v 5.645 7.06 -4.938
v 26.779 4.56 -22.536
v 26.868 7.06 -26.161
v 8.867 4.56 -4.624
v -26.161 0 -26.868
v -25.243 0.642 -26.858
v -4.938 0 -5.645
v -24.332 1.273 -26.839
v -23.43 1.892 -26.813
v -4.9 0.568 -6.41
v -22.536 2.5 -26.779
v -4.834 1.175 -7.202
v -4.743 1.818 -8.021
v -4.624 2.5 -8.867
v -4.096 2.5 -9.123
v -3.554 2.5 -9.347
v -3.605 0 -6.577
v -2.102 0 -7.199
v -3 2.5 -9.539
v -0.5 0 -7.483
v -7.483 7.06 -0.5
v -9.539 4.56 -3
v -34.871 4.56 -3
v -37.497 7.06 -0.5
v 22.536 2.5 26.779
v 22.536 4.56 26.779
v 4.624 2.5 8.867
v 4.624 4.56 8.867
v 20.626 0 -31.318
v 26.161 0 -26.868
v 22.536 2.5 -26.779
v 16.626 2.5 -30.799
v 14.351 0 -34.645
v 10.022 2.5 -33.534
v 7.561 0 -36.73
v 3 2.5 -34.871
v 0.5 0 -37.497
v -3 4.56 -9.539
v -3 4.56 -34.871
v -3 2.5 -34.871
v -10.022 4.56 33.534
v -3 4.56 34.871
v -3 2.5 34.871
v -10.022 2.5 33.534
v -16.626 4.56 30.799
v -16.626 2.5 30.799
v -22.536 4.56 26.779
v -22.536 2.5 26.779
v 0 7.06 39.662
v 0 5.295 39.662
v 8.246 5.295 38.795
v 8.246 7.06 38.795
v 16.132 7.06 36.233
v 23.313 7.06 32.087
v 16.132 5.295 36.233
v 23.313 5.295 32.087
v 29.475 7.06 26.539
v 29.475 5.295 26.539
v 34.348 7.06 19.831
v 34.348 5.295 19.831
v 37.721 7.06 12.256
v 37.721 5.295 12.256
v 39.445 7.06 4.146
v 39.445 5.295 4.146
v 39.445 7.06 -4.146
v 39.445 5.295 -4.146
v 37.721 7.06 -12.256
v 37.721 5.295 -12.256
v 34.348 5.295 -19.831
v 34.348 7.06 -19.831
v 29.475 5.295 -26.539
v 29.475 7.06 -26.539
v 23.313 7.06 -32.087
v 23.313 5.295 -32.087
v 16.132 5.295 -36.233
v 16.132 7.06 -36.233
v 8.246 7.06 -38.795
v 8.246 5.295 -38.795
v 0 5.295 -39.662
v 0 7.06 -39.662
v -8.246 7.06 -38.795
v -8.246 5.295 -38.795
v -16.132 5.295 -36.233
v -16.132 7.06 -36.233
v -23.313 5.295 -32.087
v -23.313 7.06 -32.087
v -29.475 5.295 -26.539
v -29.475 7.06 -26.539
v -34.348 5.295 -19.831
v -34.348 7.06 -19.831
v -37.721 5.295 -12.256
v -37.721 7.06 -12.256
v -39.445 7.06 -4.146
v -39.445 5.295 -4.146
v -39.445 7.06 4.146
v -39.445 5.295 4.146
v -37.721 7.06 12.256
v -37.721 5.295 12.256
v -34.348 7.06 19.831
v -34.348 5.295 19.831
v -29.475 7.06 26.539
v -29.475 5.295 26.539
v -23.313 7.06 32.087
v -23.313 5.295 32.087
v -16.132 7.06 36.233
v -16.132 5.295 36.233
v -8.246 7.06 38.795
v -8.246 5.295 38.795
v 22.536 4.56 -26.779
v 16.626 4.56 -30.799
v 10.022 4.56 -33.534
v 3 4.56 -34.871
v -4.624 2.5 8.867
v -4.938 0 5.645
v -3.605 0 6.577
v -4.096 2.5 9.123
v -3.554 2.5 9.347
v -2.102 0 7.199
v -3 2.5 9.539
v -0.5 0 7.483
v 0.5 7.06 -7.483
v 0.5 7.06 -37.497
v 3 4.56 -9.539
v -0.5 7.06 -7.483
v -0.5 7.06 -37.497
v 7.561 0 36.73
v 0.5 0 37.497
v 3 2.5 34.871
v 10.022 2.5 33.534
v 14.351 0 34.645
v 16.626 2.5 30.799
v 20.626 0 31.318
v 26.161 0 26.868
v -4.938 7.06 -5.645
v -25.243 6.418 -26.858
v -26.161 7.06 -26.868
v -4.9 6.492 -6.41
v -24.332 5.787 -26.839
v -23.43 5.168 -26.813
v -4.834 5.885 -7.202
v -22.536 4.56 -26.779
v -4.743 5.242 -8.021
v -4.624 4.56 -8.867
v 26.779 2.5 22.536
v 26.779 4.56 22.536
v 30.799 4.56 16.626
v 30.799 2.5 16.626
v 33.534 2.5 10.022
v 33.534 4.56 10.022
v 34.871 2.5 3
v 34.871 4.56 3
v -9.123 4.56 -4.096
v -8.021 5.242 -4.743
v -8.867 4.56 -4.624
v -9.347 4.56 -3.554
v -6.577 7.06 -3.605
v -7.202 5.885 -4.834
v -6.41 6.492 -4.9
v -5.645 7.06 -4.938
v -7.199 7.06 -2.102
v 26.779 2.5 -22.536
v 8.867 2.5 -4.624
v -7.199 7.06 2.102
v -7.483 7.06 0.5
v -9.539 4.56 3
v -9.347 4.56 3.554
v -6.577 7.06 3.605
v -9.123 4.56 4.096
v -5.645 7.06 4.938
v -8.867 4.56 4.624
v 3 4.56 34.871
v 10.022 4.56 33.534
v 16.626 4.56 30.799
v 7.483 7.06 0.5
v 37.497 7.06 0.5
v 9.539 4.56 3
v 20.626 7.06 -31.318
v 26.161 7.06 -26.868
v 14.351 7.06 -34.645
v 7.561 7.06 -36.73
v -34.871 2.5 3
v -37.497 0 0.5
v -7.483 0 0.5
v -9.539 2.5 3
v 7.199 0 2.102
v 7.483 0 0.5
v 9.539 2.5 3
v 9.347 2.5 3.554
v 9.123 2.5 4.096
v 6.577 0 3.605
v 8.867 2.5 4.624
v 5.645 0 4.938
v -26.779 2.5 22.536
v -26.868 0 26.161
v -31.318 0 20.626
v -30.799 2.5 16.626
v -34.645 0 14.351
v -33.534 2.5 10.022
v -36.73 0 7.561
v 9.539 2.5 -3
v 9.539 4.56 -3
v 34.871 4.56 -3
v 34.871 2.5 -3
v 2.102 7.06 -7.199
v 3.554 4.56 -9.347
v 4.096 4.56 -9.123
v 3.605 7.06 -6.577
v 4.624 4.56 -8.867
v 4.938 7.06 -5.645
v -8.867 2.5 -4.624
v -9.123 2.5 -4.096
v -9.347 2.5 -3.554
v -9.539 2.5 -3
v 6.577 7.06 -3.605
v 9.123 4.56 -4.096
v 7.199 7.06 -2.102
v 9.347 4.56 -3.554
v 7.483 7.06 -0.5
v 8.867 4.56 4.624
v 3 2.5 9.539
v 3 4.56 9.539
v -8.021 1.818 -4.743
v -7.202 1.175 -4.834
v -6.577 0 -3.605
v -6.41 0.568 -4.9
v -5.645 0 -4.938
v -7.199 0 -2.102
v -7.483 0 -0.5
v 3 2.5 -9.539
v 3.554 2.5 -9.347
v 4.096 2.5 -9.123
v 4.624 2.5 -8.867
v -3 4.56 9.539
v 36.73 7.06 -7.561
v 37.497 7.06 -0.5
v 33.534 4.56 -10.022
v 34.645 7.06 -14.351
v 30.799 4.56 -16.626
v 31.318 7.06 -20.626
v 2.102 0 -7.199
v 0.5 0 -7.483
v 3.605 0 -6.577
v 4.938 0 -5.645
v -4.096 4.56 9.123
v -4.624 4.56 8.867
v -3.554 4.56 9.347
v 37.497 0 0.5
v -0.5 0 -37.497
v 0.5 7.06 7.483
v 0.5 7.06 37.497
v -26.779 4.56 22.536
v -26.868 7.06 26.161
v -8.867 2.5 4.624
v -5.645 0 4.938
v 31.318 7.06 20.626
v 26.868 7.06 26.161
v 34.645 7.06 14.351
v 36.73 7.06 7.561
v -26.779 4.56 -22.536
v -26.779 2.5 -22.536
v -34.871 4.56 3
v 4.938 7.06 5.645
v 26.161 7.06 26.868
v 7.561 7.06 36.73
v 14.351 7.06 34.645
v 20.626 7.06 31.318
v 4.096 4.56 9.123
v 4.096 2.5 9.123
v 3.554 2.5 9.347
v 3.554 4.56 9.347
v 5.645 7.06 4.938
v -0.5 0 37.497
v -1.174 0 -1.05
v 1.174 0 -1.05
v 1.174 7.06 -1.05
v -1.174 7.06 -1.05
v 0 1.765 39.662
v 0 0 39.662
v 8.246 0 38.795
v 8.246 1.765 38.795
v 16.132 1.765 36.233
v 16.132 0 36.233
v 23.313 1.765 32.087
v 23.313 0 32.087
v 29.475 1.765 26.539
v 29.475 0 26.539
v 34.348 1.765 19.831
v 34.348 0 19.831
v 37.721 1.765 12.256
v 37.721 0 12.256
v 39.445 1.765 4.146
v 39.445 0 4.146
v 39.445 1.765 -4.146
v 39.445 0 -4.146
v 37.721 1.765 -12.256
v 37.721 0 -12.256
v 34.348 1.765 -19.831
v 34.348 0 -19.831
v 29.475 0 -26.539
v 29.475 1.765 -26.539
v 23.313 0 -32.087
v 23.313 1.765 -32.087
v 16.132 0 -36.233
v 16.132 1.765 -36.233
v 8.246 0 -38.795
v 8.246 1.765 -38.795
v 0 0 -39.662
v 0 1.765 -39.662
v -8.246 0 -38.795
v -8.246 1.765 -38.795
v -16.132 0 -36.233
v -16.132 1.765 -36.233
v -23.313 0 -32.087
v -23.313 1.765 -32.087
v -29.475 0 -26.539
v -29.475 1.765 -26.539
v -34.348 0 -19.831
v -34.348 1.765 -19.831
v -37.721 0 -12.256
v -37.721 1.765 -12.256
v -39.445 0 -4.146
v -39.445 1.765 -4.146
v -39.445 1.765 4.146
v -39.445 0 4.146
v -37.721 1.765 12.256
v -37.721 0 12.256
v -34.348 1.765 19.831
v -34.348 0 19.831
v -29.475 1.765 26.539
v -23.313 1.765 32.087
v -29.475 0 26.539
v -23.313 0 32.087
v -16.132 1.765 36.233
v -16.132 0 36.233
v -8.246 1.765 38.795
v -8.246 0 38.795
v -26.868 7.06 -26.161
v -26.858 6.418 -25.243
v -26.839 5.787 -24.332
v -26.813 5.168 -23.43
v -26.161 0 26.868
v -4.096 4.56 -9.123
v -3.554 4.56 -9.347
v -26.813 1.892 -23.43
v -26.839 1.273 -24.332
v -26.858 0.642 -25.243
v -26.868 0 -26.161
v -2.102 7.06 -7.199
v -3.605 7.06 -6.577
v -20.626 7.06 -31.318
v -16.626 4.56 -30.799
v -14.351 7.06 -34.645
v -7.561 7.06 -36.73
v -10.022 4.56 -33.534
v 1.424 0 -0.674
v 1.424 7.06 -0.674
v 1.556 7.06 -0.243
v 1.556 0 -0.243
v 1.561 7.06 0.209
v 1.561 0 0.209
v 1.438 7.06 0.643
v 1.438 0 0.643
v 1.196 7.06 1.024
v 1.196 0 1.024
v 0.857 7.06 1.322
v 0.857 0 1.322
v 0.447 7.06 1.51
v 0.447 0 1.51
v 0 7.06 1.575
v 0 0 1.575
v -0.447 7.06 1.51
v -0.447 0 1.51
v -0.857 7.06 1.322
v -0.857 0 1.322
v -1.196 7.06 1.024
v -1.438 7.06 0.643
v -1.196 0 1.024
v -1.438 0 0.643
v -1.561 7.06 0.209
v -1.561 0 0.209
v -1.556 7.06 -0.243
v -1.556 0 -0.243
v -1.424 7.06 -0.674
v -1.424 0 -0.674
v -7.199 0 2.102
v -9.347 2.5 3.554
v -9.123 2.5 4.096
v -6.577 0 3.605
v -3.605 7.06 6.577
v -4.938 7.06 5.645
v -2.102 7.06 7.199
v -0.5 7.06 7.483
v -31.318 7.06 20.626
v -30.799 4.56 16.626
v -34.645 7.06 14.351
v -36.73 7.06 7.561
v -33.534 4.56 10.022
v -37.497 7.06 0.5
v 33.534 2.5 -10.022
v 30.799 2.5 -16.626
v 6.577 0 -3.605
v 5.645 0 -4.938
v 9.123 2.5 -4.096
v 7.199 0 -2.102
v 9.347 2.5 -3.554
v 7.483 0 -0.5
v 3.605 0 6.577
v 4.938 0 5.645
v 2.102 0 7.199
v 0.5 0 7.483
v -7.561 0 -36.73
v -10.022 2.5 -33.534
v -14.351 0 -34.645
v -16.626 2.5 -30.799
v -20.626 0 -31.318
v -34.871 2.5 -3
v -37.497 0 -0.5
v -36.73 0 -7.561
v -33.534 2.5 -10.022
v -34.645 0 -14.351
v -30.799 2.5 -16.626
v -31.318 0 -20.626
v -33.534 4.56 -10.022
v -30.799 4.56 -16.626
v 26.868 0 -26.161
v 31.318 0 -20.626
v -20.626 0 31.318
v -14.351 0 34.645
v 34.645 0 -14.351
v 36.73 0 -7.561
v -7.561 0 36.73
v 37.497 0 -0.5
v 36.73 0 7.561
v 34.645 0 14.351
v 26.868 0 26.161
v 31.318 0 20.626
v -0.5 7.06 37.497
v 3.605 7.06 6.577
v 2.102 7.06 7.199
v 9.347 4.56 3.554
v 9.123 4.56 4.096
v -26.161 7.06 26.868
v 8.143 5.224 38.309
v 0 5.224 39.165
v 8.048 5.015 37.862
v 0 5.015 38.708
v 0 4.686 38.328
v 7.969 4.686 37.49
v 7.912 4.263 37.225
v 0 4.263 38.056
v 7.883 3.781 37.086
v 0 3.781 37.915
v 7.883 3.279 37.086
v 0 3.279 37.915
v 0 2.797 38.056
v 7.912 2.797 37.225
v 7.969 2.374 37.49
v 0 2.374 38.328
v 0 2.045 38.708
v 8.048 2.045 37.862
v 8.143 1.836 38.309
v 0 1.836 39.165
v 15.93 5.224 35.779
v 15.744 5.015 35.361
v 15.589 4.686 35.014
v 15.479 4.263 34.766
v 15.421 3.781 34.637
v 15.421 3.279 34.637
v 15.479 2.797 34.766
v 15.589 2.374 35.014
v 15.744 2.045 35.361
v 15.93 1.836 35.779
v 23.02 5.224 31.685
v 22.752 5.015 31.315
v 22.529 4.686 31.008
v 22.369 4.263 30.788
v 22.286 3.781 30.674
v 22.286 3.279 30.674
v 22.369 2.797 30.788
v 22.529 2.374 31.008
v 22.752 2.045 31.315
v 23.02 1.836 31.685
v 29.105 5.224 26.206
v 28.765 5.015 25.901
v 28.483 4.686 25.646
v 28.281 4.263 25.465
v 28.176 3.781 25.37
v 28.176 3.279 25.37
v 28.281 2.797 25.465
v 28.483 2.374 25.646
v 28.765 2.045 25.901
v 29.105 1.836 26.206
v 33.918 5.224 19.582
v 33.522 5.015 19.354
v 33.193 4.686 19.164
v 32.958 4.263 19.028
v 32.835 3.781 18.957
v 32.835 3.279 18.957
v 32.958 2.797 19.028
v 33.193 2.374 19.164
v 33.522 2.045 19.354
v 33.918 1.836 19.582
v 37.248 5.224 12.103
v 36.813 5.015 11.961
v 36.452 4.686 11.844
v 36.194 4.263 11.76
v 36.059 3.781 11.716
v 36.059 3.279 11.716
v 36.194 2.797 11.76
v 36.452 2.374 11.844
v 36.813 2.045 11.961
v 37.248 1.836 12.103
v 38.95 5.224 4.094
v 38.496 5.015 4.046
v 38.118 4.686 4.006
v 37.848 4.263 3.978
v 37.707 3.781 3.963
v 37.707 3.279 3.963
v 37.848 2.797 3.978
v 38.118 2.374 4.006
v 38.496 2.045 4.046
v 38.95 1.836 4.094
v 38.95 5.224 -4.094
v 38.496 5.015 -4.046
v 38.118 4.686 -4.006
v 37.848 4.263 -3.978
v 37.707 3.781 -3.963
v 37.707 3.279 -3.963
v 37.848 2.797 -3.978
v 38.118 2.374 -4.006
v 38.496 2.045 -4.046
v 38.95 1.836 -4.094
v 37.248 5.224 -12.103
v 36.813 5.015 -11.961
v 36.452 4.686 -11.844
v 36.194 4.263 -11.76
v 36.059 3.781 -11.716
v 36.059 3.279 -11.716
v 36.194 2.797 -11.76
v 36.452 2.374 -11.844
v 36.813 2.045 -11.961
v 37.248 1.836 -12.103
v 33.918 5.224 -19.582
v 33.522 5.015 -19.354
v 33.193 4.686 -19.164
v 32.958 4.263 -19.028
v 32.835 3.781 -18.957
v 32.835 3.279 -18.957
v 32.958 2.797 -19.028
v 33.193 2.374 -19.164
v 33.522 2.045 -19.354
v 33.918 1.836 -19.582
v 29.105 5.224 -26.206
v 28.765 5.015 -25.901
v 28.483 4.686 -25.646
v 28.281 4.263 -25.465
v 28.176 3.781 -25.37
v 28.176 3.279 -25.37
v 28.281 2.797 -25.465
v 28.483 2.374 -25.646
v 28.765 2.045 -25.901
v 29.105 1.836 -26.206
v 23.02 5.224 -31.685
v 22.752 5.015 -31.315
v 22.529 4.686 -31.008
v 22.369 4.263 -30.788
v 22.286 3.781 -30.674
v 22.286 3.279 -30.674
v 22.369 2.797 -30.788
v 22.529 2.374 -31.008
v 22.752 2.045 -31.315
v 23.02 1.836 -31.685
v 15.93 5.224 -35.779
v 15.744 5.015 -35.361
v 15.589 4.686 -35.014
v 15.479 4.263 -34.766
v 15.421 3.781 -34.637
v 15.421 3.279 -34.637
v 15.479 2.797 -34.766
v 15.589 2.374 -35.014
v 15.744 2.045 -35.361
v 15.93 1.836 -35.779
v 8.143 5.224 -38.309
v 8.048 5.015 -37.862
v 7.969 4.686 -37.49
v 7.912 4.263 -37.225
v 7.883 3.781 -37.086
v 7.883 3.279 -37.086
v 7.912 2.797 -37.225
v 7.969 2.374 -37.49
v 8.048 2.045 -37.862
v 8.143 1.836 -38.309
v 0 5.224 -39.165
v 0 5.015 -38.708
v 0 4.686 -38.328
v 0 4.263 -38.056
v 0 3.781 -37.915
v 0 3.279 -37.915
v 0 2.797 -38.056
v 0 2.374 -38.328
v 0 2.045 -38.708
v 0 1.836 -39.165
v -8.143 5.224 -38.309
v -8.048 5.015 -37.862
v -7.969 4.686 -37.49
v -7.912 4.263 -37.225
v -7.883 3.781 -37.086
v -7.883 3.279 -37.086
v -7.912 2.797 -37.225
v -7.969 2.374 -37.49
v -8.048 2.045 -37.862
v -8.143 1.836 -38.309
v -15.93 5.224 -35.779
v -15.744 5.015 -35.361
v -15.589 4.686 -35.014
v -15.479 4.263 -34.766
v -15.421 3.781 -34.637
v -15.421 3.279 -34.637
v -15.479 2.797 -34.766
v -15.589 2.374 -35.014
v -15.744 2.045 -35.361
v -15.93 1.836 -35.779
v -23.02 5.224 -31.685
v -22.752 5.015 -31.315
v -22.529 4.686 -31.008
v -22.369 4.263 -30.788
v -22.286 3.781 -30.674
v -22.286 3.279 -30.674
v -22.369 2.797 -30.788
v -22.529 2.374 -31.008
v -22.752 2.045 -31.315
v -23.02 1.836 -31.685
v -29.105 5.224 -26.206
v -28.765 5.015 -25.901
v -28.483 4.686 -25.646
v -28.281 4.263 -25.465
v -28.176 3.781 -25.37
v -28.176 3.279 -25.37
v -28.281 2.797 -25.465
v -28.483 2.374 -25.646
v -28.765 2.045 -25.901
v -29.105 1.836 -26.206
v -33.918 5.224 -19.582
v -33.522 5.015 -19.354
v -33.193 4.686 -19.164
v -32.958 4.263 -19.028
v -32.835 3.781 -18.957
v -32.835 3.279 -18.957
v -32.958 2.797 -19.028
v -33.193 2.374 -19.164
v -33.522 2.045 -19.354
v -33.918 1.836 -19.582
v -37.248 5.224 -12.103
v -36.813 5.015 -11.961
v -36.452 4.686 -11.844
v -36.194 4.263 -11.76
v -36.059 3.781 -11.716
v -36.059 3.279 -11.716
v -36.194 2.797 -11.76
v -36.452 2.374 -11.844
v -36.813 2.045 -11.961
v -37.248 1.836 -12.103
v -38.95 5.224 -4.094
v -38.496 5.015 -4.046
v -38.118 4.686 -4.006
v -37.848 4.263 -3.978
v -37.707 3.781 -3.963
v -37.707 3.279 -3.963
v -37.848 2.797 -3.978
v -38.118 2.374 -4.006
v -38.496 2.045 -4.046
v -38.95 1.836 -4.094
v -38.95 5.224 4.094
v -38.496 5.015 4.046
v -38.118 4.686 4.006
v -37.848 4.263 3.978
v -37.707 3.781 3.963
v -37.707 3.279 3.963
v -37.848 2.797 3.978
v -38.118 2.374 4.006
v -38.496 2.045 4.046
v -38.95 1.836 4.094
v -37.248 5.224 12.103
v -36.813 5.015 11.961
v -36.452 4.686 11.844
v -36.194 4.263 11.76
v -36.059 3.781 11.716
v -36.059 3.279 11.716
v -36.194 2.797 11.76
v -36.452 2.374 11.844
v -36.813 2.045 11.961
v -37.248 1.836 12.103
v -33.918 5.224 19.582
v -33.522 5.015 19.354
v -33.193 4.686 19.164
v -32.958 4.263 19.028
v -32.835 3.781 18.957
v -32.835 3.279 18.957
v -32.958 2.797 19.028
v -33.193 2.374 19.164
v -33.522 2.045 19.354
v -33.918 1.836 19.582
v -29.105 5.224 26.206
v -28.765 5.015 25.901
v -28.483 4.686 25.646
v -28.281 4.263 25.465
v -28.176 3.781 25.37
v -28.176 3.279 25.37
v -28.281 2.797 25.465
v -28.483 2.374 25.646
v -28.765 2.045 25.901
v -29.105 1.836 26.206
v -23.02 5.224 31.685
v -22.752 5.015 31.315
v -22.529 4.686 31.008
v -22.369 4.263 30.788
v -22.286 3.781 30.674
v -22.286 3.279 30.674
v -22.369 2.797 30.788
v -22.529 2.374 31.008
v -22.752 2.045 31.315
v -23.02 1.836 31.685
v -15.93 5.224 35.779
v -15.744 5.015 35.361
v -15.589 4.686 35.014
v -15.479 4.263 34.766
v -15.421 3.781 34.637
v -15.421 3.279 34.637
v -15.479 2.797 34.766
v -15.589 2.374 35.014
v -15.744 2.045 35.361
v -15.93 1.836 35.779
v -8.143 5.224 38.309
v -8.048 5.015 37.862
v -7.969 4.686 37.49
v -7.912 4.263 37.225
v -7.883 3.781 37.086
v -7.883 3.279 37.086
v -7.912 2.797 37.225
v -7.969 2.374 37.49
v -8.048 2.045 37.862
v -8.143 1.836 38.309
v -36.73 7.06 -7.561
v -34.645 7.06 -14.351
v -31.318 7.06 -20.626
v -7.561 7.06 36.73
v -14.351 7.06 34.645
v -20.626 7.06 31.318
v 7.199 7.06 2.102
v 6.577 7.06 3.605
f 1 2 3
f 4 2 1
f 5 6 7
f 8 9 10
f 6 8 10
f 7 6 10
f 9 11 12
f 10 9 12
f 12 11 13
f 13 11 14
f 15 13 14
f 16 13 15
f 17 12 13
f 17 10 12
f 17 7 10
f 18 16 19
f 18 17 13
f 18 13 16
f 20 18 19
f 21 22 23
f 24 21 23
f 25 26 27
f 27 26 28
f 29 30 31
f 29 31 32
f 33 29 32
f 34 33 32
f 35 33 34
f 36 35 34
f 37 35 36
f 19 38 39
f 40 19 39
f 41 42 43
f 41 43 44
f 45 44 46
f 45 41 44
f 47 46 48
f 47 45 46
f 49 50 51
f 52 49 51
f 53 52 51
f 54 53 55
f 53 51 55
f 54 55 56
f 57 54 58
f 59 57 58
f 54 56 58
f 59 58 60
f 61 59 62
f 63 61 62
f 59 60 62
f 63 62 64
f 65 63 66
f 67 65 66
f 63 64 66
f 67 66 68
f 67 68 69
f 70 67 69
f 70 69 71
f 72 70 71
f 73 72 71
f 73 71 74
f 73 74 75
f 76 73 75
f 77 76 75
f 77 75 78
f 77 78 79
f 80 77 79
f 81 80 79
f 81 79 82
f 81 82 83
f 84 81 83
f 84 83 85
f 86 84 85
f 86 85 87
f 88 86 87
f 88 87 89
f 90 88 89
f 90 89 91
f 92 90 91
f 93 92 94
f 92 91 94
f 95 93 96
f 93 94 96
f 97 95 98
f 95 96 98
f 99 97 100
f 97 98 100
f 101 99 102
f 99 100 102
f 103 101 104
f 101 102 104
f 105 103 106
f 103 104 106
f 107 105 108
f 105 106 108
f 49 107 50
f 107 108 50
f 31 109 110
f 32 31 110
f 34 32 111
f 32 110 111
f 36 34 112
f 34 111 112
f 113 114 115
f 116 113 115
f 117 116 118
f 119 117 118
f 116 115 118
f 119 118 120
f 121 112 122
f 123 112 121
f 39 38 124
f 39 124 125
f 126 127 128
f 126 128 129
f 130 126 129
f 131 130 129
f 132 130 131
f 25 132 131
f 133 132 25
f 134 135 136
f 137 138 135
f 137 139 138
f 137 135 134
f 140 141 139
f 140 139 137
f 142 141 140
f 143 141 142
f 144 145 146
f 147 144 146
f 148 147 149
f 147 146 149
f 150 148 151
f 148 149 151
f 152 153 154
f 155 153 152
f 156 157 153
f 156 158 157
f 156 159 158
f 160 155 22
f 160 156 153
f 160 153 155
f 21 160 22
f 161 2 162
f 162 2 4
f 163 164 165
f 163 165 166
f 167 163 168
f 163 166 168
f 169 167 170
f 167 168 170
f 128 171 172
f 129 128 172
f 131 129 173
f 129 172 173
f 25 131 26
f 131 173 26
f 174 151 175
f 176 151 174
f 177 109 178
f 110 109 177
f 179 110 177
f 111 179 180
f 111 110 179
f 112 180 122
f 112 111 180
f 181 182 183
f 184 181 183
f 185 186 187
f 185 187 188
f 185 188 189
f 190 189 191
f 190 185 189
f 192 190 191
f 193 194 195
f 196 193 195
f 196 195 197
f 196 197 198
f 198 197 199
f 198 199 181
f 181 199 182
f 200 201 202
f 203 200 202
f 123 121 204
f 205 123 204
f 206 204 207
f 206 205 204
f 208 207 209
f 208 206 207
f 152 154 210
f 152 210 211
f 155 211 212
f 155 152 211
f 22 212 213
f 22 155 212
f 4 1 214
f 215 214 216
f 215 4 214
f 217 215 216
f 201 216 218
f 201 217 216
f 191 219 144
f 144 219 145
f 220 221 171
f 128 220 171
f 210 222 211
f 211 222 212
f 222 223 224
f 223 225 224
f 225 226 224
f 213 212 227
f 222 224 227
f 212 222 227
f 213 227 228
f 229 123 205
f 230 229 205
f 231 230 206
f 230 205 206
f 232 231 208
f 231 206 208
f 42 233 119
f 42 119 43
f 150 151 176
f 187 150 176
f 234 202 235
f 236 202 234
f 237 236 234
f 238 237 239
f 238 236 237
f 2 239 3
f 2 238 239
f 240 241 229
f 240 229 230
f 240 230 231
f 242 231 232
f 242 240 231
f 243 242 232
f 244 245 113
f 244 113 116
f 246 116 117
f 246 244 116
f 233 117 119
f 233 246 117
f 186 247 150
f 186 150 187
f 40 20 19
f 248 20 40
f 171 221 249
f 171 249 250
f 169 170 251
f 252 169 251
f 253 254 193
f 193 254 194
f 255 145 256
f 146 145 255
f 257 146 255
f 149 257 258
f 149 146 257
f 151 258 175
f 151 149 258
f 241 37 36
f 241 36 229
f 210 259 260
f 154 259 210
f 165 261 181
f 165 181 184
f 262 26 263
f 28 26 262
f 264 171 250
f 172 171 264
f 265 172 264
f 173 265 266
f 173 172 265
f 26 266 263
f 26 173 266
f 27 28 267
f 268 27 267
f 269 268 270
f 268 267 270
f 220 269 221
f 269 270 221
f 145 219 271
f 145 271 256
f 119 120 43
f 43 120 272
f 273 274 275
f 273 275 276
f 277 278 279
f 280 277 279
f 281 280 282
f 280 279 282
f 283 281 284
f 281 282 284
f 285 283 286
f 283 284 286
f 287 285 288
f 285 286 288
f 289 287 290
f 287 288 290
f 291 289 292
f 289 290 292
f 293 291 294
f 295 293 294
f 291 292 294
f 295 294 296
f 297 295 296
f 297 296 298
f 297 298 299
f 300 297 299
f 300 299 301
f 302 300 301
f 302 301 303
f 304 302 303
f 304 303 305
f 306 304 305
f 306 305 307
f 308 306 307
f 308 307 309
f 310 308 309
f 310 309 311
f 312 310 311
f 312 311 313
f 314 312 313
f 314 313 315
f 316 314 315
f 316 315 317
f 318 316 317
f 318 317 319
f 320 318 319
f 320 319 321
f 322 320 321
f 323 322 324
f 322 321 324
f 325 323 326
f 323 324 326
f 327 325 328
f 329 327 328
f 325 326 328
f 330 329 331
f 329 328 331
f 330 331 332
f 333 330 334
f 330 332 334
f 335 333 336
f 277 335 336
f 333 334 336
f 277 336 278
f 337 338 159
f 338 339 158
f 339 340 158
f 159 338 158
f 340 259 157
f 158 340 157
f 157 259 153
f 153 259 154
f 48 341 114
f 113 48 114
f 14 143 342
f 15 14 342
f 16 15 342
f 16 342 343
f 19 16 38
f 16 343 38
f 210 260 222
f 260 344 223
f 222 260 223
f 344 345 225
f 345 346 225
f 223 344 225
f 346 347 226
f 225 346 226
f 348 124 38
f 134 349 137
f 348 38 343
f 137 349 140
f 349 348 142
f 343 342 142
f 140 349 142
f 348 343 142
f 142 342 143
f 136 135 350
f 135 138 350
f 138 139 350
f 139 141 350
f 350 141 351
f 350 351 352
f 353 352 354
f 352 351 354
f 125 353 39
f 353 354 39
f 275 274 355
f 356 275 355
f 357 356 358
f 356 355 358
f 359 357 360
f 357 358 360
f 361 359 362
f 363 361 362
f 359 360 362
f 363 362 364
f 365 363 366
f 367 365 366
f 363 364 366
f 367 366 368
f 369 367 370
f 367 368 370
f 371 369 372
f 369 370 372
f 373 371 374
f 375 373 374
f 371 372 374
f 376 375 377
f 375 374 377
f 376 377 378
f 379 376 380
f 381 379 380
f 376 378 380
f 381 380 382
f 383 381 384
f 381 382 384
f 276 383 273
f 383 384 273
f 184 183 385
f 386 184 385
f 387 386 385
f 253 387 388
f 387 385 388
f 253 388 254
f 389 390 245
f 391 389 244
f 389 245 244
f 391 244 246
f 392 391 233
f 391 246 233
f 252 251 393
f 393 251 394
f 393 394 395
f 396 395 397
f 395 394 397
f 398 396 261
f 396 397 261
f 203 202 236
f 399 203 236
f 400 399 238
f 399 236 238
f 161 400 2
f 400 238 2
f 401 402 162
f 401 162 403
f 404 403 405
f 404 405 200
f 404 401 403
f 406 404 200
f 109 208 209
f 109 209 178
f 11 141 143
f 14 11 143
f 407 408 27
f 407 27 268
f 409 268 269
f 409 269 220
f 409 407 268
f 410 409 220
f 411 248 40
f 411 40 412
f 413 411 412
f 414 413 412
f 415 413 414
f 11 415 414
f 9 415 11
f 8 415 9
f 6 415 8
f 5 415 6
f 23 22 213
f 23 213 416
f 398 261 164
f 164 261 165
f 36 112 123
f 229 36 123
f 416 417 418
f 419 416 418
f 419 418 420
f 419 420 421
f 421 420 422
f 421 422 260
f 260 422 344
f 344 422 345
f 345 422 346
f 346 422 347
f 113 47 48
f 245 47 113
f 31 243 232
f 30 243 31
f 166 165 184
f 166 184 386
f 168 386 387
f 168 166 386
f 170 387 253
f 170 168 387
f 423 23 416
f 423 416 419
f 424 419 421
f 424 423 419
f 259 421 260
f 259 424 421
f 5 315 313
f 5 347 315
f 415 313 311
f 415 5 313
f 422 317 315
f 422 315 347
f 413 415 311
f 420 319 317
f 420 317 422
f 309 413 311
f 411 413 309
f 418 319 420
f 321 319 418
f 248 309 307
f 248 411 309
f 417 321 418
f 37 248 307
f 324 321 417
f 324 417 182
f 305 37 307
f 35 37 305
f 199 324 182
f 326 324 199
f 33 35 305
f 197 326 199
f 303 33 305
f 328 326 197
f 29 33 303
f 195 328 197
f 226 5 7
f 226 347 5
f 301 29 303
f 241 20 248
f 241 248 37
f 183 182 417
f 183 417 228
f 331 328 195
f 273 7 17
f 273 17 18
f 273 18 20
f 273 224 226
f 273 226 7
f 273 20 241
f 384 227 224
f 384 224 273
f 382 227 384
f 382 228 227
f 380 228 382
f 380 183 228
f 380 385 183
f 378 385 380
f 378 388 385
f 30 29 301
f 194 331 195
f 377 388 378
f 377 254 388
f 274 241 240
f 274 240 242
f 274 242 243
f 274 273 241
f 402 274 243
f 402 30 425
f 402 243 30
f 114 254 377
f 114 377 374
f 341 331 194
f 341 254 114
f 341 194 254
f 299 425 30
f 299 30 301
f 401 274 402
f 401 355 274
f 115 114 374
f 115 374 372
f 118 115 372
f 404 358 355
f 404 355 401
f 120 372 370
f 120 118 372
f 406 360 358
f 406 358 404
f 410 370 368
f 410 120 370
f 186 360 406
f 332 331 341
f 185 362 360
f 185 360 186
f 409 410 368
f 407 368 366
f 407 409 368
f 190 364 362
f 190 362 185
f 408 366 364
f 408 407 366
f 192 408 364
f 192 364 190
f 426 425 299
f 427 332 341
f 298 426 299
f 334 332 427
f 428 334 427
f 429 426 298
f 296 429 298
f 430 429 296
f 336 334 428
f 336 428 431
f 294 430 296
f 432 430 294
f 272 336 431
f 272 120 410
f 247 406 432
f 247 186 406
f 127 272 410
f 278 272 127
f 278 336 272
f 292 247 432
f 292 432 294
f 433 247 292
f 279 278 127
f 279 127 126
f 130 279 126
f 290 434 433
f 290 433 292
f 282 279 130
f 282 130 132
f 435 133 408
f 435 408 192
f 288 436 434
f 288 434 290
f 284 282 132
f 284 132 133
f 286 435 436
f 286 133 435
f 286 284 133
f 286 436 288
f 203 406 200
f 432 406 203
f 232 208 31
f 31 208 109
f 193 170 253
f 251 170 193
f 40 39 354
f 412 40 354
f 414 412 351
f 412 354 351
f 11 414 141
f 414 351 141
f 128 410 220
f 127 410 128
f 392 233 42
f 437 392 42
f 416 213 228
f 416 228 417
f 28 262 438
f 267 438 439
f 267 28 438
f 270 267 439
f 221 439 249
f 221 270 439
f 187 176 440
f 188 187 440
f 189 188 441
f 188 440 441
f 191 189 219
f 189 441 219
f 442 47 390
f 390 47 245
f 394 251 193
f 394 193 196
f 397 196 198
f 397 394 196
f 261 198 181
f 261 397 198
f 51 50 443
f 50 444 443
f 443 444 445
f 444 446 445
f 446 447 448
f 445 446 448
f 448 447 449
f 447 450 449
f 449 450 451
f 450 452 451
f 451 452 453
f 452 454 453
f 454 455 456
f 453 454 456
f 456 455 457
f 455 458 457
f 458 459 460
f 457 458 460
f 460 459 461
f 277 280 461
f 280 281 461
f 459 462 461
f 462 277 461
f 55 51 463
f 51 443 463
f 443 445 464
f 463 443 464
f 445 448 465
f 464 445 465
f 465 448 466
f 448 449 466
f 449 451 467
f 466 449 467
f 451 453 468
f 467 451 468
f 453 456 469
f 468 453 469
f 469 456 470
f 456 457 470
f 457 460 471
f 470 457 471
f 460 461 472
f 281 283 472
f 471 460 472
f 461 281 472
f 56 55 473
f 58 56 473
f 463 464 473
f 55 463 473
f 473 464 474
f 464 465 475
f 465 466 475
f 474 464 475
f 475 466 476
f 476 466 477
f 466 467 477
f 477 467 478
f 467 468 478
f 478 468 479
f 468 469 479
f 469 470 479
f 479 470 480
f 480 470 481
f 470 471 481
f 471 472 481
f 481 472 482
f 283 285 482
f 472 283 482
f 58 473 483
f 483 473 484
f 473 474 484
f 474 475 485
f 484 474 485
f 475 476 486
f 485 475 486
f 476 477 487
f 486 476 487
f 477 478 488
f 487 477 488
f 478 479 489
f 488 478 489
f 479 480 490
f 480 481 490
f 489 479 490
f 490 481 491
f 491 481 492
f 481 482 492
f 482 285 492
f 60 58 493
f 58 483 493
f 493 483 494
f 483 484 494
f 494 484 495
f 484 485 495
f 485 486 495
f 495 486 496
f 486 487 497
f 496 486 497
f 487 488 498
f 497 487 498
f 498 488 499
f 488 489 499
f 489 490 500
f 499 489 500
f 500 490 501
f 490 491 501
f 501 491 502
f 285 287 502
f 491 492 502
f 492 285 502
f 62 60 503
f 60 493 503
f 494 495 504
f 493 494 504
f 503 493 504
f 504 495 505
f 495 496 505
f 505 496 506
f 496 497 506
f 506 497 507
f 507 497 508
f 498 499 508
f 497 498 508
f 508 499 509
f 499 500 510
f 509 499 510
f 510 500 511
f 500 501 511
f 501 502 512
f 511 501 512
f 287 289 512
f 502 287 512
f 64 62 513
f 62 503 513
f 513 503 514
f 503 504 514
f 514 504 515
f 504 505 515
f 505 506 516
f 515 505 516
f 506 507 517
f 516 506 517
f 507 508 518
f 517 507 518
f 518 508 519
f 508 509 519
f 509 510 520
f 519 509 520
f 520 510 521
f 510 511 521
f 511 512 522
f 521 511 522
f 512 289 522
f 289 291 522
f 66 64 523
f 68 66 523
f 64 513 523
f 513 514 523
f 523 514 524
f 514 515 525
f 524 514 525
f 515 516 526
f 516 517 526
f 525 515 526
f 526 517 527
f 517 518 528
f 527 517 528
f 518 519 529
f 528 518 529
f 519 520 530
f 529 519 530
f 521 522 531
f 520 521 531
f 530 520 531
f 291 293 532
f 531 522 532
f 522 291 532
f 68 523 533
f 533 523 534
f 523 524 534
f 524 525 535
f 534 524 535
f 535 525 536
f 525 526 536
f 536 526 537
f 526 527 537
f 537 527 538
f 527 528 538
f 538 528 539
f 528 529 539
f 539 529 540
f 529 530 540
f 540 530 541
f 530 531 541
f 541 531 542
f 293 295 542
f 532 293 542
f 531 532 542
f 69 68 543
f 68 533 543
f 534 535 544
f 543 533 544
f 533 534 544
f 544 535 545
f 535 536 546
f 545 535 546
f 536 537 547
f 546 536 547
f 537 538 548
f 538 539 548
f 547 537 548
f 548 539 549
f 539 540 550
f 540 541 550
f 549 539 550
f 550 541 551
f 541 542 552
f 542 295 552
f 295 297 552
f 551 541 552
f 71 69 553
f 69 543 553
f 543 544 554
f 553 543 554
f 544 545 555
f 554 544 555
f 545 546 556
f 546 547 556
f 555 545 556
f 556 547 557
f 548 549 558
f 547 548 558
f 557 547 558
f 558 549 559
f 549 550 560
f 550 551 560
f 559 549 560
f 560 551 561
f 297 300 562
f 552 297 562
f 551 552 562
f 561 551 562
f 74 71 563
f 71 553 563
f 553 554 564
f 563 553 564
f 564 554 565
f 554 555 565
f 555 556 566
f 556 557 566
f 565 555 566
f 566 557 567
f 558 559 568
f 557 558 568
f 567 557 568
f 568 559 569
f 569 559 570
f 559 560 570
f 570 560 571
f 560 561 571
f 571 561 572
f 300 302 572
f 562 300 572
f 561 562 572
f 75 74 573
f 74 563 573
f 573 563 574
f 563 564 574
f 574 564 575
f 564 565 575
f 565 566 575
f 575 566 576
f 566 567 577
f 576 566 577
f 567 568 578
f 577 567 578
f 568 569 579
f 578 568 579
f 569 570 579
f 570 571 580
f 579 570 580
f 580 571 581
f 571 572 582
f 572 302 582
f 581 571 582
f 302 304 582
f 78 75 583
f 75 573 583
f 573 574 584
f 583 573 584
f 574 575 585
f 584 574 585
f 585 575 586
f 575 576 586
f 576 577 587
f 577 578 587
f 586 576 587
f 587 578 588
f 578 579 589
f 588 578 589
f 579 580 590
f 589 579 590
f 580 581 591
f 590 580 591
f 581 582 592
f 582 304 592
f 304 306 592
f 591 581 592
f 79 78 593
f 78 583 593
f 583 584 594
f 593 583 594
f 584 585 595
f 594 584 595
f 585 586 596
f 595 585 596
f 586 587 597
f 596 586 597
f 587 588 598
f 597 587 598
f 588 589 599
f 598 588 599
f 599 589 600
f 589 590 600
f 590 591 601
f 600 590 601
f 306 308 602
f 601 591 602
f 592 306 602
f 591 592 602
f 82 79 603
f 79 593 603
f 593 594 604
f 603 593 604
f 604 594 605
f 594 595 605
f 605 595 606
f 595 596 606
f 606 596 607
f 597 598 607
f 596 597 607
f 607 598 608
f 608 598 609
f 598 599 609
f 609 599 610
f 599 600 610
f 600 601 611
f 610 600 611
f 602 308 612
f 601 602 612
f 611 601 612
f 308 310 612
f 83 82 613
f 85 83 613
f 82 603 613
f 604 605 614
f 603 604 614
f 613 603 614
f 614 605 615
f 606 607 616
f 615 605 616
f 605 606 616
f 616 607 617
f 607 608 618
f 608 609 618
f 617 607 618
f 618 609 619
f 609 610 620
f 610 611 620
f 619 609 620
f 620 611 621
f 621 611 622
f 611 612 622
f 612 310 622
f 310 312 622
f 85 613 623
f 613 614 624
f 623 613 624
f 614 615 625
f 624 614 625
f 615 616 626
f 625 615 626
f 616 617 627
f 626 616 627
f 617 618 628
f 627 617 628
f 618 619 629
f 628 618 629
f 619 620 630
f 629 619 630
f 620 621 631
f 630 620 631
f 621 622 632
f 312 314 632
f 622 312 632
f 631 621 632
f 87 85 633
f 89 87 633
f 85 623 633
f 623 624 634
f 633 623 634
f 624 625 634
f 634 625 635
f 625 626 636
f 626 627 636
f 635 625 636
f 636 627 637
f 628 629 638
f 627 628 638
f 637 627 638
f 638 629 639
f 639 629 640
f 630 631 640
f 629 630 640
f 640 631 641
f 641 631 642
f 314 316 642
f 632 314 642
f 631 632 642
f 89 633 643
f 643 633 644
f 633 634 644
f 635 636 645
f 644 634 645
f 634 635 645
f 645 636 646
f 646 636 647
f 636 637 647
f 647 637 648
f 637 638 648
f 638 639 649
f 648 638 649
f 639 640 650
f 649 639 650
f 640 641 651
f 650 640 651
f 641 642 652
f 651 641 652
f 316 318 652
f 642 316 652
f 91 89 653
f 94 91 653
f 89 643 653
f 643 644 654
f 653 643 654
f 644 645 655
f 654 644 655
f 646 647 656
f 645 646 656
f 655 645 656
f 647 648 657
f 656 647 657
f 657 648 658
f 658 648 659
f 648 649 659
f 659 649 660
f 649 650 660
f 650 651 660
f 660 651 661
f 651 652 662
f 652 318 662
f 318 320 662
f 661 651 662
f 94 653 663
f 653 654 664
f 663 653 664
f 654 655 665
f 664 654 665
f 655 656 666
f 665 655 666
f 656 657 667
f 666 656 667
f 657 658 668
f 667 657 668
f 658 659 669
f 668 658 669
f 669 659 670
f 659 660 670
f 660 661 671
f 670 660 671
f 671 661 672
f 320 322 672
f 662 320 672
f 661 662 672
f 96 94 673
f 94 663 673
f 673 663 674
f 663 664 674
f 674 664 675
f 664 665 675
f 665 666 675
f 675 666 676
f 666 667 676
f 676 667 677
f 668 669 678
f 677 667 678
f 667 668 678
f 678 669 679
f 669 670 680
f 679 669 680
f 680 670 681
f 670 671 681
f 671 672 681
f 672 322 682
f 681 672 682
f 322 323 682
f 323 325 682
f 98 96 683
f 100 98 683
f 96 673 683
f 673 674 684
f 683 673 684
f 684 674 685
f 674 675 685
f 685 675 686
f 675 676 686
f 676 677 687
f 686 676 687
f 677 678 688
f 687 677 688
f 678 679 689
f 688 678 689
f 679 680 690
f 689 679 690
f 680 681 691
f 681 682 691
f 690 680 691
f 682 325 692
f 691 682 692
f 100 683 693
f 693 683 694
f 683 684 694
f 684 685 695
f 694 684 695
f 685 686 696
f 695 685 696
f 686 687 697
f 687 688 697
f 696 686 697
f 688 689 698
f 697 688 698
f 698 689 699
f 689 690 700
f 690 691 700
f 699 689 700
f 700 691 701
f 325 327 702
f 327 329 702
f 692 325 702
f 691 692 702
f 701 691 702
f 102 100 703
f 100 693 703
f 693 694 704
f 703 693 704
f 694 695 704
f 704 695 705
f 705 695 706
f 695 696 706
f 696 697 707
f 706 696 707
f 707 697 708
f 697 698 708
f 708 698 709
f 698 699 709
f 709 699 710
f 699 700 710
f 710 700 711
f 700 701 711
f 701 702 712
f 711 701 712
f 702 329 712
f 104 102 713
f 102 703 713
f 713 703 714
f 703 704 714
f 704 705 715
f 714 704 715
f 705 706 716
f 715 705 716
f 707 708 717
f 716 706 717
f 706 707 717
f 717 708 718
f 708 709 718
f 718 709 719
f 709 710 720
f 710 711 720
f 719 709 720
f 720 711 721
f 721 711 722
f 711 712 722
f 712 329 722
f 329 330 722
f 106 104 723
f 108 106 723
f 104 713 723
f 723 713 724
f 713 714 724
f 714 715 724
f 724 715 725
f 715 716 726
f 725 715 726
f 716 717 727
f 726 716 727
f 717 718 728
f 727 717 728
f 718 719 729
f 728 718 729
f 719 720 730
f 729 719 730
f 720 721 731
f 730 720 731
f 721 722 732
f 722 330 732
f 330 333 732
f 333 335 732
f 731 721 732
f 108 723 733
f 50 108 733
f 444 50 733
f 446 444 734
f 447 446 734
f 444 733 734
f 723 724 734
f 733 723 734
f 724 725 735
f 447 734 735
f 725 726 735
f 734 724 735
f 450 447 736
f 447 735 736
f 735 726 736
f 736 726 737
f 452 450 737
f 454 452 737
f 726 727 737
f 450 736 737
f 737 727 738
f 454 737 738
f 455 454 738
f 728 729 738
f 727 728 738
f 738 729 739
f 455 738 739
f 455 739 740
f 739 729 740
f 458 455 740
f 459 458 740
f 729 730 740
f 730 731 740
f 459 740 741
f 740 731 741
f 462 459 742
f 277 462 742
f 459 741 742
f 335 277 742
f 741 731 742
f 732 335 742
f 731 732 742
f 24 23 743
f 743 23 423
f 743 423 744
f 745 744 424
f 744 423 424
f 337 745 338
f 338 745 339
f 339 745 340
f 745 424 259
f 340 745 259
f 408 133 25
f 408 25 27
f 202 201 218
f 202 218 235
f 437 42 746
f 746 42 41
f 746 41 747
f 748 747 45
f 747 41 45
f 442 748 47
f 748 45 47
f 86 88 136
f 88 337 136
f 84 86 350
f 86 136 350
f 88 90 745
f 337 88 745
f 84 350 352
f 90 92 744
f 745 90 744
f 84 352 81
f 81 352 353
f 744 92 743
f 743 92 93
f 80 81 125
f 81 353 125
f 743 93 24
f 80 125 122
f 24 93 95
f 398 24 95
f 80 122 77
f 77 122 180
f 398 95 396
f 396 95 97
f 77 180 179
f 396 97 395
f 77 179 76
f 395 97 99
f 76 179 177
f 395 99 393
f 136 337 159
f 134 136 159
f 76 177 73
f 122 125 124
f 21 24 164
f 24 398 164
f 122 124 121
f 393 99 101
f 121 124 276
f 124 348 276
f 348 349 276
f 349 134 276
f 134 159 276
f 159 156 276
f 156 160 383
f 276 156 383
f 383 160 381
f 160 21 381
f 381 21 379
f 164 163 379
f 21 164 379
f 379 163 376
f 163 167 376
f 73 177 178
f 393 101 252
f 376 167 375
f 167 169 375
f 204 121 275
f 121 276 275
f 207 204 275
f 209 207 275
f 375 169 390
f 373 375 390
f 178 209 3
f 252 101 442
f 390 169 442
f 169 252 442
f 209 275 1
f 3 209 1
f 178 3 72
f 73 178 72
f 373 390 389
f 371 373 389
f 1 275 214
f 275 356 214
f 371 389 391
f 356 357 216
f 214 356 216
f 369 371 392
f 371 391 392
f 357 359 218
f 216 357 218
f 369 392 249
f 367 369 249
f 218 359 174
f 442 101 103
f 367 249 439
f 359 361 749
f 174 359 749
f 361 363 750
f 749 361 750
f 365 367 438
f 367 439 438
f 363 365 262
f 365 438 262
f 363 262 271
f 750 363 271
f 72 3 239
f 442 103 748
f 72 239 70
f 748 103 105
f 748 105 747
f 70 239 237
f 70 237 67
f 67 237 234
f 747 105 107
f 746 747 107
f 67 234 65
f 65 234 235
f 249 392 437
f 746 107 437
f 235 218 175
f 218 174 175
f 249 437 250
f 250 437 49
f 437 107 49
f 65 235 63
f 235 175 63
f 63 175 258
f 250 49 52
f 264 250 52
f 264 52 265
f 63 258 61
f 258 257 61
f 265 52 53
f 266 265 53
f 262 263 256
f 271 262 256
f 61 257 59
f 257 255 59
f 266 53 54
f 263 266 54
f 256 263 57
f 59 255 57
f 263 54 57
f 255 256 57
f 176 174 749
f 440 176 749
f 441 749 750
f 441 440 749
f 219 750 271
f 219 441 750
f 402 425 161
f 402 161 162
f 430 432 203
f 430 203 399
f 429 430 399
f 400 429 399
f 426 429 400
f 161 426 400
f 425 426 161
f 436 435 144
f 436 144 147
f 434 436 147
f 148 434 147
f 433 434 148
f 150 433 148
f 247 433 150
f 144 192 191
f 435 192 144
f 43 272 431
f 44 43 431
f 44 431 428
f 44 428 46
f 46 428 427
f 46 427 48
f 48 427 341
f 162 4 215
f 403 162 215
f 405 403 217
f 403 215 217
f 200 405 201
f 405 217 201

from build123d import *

# Parameters (mm, degrees)
SKETCH1_R           = 39.6621
BOSS_EXTRUDE2_DEPTH = 7.06
SKETCH5_R           = 1.7653
SKETCH7_R           = 1.575
CUT_EXTRUDE1_DEPTH  = 7.06
BOSS_EXTRUDE4_DEPTH = 7.06
CUT_EXTRUDE2_DEPTH  = 7.06
CHAMFER9_SIZE       = 2.5
CHAMFER10_SIZE      = 2.5
CHAMFER11_SIZE      = 2.5
CHAMFER12_SIZE      = 2.5


with BuildPart() as part:
    # Sketch1 → Boss-Extrude2 (new body)
    with BuildSketch(Plane(origin=(0, 0, 0), x_dir=(1, 0, 0), z_dir=(0, 1, 0))):
        with Locations(Location((0, 0, 0), (0, 0, 270))):
            Circle(SKETCH1_R)
    extrude(amount=BOSS_EXTRUDE2_DEPTH)

    # Sketch5 → Cut-Revolve1 (revolve, cut)
    with BuildSketch(Plane(origin=(0, 0, 0), x_dir=(0, 0, -1), z_dir=(1, 0, 0)), mode=Mode.PRIVATE) as cut_revolve1_sk:
        with Locations((39.6621, 3.53)):
            Circle(SKETCH5_R)
    revolve(cut_revolve1_sk.sketch.rotate(Axis((0, 3.53, 0), (0, 1, 0)), 180), axis=Axis((0, 3.53, 0), (0, 1, 0)), mode=Mode.SUBTRACT)

    # Sketch7 → Cut-Extrude1 (cut)
    with BuildSketch(Plane.XZ):
        with Locations(Location((0, 0, 0), (0, 0, 270))):
            Circle(SKETCH7_R)
    extrude(amount=-CUT_EXTRUDE1_DEPTH, mode=Mode.SUBTRACT)

    # Sketch8 → Boss-Extrude4 (add)
    with BuildSketch(Plane.XZ):
        with BuildLine():
            Line((1.173935688, -1.05), (-1.173935688, -1.05))
            ThreePointArc((-1.173935688, -1.05), (0, -1.575), (1.173935688, -1.05))
        make_face()
    extrude(amount=-BOSS_EXTRUDE4_DEPTH)

    # Sketch9 → Cut-Extrude2 (cut)
    with BuildSketch(Plane(origin=(0, 7.06, 0), x_dir=(1, 0, 0), z_dir=(0, 1, 0))):
        with BuildLine():
            Line((-26.778976355, 22.536335668), (-8.866689125, 4.624048438))
            ThreePointArc((-8.866689125, 4.624048438), (-9.238795325, 3.826834324), (-9.539392014, 3))
            Line((-9.539392014, 3), (-34.871191548, 3))
            ThreePointArc((-34.871191548, 3), (-32.335783638, 13.393920133), (-26.778976355, 22.536335668))
        make_face()
        with BuildLine():
            Line((-34.871191548, -3), (-9.539392014, -3))
            ThreePointArc((-9.539392014, -3), (-9.238795325, -3.826834324), (-8.866689125, -4.624048438))
            Line((-8.866689125, -4.624048438), (-26.778976355, -22.536335668))
            ThreePointArc((-26.778976355, -22.536335668), (-32.335783638, -13.393920133), (-34.871191548, -3))
        make_face()
        with BuildLine():
            Line((-22.536335668, -26.778976355), (-4.624048438, -8.866689125))
            ThreePointArc((-4.624048438, -8.866689125), (-3.826834324, -9.238795325), (-3, -9.539392014))
            Line((-3, -9.539392014), (-3, -34.871191548))
            ThreePointArc((-3, -34.871191548), (-13.393920133, -32.335783638), (-22.536335668, -26.778976355))
        make_face()
        with BuildLine():
            Line((3, -9.539392014), (3, -34.871191548))
            ThreePointArc((3, -34.871191548), (13.393920133, -32.335783638), (22.536335668, -26.778976355))
            Line((22.536335668, -26.778976355), (4.624048438, -8.866689125))
            ThreePointArc((4.624048438, -8.866689125), (3.826834324, -9.238795325), (3, -9.539392014))
        make_face()
        with BuildLine():
            Line((8.866689125, -4.624048438), (26.778976355, -22.536335668))
            ThreePointArc((26.778976355, -22.536335668), (32.335783638, -13.393920133), (34.871191548, -3))
            Line((34.871191548, -3), (9.539392014, -3))
            ThreePointArc((9.539392014, -3), (9.238795325, -3.826834324), (8.866689125, -4.624048438))
        make_face()
        with BuildLine():
            Line((9.539392014, 3), (34.871191548, 3))
            ThreePointArc((34.871191548, 3), (32.335783638, 13.393920133), (26.778976355, 22.536335668))
            Line((26.778976355, 22.536335668), (8.866689125, 4.624048438))
            ThreePointArc((8.866689125, 4.624048438), (9.238795325, 3.826834324), (9.539392014, 3))
        make_face()
        with BuildLine():
            Line((3, 34.871191548), (3, 9.539392014))
            ThreePointArc((3, 9.539392014), (3.826834324, 9.238795325), (4.624048438, 8.866689125))
            Line((4.624048438, 8.866689125), (22.536335668, 26.778976355))
            ThreePointArc((22.536335668, 26.778976355), (13.393920133, 32.335783638), (3, 34.871191548))
        make_face()
        with BuildLine():
            Line((-22.536335668, 26.778976355), (-4.624048438, 8.866689125))
            ThreePointArc((-4.624048438, 8.866689125), (-3.826834324, 9.238795325), (-3, 9.539392014))
            Line((-3, 9.539392014), (-3, 34.871191548))
            ThreePointArc((-3, 34.871191548), (-13.393920133, 32.335783638), (-22.536335668, 26.778976355))
        make_face()
    extrude(amount=-CUT_EXTRUDE2_DEPTH, mode=Mode.SUBTRACT)

    # Chamfer9
    chamfer9_edges = [part.edges().sort_by_distance(p)[0] for p in [
        (-13.580192053, 7.06, -17.82283274),
        (-17.82283274, 7.06, -13.580192053),
    ]]
    chamfer(chamfer9_edges, length=CHAMFER9_SIZE)

    # Chamfer10
    chamfer10_edges = [part.edges().sort_by_distance(p)[0] for p in [
        (-13.580192053, 0, -17.82283274),
        (-17.82283274, 0, -13.580192053),
    ]]
    chamfer(chamfer10_edges, length=CHAMFER10_SIZE)

    # Chamfer11
    chamfer11_edges = [part.edges().sort_by_distance(p)[0] for p in [
        (-9.238795325, 7.06, 3.826834324),
        (-22.205291781, 7.06, 3),
        (-32.335783638, 7.06, 13.393920133),
        (-17.82283274, 7.06, 13.580192053),
        (-3.826834324, 7.06, 9.238795325),
        (-13.580192053, 7.06, 17.82283274),
        (-13.393920133, 7.06, 32.335783638),
        (-3, 7.06, 22.205291781),
        (13.393920133, 7.06, 32.335783638),
        (3, 7.06, 22.205291781),
        (3.826834324, 7.06, 9.238795325),
        (13.580192053, 7.06, 17.82283274),
        (9.238795325, 7.06, 3.826834324),
        (17.82283274, 7.06, 13.580192053),
        (32.335783638, 7.06, 13.393920133),
        (22.205291781, 7.06, 3),
        (32.335783638, 7.06, -13.393920133),
        (22.205291781, 7.06, -3),
        (17.82283274, 7.06, -13.580192053),
        (9.238795325, 7.06, -3.826834324),
        (3.826834324, 7.06, -9.238795325),
        (13.580192053, 7.06, -17.82283274),
        (13.393920133, 7.06, -32.335783638),
        (3, 7.06, -22.205291781),
        (-14.541651461, 7.06, -31.836148837),
        (-3, 7.06, -22.205291781),
        (-4.969104941, 7.06, -8.678017981),
        (-8.678017981, 7.06, -4.969104941),
        (-22.205291781, 7.06, -3),
        (-31.836148837, 7.06, -14.541651461),
    ]]
    chamfer(chamfer11_edges, length=CHAMFER11_SIZE)

    # Chamfer12
    chamfer12_edges = [part.edges().sort_by_distance(p)[0] for p in [
        (3.826834324, 0, -9.238795325),
        (13.580192053, 0, -17.82283274),
        (13.393920133, 0, -32.335783638),
        (3, 0, -22.205291781),
        (-14.541651461, 0, -31.836148837),
        (-4.969104941, 0, -8.678017981),
        (-3, 0, -22.205291781),
        (-8.678017981, 0, -4.969104941),
        (-31.836148837, 0, -14.541651461),
        (-22.205291781, 0, -3),
        (-17.82283274, 0, 13.580192053),
        (-9.238795325, 0, 3.826834324),
        (-32.335783638, 0, 13.393920133),
        (-22.205291781, 0, 3),
        (-3.826834324, 0, 9.238795325),
        (-13.580192053, 0, 17.82283274),
        (-13.393920133, 0, 32.335783638),
        (-3, 0, 22.205291781),
        (3.826834324, 0, 9.238795325),
        (3, 0, 22.205291781),
        (13.393920133, 0, 32.335783638),
        (13.580192053, 0, 17.82283274),
        (9.238795325, 0, 3.826834324),
        (17.82283274, 0, 13.580192053),
        (32.335783638, 0, 13.393920133),
        (22.205291781, 0, 3),
        (9.238795325, 0, -3.826834324),
        (17.82283274, 0, -13.580192053),
        (22.205291781, 0, -3),
        (32.335783638, 0, -13.393920133),
    ]]
    chamfer(chamfer12_edges, length=CHAMFER12_SIZE)


solid = part.part
